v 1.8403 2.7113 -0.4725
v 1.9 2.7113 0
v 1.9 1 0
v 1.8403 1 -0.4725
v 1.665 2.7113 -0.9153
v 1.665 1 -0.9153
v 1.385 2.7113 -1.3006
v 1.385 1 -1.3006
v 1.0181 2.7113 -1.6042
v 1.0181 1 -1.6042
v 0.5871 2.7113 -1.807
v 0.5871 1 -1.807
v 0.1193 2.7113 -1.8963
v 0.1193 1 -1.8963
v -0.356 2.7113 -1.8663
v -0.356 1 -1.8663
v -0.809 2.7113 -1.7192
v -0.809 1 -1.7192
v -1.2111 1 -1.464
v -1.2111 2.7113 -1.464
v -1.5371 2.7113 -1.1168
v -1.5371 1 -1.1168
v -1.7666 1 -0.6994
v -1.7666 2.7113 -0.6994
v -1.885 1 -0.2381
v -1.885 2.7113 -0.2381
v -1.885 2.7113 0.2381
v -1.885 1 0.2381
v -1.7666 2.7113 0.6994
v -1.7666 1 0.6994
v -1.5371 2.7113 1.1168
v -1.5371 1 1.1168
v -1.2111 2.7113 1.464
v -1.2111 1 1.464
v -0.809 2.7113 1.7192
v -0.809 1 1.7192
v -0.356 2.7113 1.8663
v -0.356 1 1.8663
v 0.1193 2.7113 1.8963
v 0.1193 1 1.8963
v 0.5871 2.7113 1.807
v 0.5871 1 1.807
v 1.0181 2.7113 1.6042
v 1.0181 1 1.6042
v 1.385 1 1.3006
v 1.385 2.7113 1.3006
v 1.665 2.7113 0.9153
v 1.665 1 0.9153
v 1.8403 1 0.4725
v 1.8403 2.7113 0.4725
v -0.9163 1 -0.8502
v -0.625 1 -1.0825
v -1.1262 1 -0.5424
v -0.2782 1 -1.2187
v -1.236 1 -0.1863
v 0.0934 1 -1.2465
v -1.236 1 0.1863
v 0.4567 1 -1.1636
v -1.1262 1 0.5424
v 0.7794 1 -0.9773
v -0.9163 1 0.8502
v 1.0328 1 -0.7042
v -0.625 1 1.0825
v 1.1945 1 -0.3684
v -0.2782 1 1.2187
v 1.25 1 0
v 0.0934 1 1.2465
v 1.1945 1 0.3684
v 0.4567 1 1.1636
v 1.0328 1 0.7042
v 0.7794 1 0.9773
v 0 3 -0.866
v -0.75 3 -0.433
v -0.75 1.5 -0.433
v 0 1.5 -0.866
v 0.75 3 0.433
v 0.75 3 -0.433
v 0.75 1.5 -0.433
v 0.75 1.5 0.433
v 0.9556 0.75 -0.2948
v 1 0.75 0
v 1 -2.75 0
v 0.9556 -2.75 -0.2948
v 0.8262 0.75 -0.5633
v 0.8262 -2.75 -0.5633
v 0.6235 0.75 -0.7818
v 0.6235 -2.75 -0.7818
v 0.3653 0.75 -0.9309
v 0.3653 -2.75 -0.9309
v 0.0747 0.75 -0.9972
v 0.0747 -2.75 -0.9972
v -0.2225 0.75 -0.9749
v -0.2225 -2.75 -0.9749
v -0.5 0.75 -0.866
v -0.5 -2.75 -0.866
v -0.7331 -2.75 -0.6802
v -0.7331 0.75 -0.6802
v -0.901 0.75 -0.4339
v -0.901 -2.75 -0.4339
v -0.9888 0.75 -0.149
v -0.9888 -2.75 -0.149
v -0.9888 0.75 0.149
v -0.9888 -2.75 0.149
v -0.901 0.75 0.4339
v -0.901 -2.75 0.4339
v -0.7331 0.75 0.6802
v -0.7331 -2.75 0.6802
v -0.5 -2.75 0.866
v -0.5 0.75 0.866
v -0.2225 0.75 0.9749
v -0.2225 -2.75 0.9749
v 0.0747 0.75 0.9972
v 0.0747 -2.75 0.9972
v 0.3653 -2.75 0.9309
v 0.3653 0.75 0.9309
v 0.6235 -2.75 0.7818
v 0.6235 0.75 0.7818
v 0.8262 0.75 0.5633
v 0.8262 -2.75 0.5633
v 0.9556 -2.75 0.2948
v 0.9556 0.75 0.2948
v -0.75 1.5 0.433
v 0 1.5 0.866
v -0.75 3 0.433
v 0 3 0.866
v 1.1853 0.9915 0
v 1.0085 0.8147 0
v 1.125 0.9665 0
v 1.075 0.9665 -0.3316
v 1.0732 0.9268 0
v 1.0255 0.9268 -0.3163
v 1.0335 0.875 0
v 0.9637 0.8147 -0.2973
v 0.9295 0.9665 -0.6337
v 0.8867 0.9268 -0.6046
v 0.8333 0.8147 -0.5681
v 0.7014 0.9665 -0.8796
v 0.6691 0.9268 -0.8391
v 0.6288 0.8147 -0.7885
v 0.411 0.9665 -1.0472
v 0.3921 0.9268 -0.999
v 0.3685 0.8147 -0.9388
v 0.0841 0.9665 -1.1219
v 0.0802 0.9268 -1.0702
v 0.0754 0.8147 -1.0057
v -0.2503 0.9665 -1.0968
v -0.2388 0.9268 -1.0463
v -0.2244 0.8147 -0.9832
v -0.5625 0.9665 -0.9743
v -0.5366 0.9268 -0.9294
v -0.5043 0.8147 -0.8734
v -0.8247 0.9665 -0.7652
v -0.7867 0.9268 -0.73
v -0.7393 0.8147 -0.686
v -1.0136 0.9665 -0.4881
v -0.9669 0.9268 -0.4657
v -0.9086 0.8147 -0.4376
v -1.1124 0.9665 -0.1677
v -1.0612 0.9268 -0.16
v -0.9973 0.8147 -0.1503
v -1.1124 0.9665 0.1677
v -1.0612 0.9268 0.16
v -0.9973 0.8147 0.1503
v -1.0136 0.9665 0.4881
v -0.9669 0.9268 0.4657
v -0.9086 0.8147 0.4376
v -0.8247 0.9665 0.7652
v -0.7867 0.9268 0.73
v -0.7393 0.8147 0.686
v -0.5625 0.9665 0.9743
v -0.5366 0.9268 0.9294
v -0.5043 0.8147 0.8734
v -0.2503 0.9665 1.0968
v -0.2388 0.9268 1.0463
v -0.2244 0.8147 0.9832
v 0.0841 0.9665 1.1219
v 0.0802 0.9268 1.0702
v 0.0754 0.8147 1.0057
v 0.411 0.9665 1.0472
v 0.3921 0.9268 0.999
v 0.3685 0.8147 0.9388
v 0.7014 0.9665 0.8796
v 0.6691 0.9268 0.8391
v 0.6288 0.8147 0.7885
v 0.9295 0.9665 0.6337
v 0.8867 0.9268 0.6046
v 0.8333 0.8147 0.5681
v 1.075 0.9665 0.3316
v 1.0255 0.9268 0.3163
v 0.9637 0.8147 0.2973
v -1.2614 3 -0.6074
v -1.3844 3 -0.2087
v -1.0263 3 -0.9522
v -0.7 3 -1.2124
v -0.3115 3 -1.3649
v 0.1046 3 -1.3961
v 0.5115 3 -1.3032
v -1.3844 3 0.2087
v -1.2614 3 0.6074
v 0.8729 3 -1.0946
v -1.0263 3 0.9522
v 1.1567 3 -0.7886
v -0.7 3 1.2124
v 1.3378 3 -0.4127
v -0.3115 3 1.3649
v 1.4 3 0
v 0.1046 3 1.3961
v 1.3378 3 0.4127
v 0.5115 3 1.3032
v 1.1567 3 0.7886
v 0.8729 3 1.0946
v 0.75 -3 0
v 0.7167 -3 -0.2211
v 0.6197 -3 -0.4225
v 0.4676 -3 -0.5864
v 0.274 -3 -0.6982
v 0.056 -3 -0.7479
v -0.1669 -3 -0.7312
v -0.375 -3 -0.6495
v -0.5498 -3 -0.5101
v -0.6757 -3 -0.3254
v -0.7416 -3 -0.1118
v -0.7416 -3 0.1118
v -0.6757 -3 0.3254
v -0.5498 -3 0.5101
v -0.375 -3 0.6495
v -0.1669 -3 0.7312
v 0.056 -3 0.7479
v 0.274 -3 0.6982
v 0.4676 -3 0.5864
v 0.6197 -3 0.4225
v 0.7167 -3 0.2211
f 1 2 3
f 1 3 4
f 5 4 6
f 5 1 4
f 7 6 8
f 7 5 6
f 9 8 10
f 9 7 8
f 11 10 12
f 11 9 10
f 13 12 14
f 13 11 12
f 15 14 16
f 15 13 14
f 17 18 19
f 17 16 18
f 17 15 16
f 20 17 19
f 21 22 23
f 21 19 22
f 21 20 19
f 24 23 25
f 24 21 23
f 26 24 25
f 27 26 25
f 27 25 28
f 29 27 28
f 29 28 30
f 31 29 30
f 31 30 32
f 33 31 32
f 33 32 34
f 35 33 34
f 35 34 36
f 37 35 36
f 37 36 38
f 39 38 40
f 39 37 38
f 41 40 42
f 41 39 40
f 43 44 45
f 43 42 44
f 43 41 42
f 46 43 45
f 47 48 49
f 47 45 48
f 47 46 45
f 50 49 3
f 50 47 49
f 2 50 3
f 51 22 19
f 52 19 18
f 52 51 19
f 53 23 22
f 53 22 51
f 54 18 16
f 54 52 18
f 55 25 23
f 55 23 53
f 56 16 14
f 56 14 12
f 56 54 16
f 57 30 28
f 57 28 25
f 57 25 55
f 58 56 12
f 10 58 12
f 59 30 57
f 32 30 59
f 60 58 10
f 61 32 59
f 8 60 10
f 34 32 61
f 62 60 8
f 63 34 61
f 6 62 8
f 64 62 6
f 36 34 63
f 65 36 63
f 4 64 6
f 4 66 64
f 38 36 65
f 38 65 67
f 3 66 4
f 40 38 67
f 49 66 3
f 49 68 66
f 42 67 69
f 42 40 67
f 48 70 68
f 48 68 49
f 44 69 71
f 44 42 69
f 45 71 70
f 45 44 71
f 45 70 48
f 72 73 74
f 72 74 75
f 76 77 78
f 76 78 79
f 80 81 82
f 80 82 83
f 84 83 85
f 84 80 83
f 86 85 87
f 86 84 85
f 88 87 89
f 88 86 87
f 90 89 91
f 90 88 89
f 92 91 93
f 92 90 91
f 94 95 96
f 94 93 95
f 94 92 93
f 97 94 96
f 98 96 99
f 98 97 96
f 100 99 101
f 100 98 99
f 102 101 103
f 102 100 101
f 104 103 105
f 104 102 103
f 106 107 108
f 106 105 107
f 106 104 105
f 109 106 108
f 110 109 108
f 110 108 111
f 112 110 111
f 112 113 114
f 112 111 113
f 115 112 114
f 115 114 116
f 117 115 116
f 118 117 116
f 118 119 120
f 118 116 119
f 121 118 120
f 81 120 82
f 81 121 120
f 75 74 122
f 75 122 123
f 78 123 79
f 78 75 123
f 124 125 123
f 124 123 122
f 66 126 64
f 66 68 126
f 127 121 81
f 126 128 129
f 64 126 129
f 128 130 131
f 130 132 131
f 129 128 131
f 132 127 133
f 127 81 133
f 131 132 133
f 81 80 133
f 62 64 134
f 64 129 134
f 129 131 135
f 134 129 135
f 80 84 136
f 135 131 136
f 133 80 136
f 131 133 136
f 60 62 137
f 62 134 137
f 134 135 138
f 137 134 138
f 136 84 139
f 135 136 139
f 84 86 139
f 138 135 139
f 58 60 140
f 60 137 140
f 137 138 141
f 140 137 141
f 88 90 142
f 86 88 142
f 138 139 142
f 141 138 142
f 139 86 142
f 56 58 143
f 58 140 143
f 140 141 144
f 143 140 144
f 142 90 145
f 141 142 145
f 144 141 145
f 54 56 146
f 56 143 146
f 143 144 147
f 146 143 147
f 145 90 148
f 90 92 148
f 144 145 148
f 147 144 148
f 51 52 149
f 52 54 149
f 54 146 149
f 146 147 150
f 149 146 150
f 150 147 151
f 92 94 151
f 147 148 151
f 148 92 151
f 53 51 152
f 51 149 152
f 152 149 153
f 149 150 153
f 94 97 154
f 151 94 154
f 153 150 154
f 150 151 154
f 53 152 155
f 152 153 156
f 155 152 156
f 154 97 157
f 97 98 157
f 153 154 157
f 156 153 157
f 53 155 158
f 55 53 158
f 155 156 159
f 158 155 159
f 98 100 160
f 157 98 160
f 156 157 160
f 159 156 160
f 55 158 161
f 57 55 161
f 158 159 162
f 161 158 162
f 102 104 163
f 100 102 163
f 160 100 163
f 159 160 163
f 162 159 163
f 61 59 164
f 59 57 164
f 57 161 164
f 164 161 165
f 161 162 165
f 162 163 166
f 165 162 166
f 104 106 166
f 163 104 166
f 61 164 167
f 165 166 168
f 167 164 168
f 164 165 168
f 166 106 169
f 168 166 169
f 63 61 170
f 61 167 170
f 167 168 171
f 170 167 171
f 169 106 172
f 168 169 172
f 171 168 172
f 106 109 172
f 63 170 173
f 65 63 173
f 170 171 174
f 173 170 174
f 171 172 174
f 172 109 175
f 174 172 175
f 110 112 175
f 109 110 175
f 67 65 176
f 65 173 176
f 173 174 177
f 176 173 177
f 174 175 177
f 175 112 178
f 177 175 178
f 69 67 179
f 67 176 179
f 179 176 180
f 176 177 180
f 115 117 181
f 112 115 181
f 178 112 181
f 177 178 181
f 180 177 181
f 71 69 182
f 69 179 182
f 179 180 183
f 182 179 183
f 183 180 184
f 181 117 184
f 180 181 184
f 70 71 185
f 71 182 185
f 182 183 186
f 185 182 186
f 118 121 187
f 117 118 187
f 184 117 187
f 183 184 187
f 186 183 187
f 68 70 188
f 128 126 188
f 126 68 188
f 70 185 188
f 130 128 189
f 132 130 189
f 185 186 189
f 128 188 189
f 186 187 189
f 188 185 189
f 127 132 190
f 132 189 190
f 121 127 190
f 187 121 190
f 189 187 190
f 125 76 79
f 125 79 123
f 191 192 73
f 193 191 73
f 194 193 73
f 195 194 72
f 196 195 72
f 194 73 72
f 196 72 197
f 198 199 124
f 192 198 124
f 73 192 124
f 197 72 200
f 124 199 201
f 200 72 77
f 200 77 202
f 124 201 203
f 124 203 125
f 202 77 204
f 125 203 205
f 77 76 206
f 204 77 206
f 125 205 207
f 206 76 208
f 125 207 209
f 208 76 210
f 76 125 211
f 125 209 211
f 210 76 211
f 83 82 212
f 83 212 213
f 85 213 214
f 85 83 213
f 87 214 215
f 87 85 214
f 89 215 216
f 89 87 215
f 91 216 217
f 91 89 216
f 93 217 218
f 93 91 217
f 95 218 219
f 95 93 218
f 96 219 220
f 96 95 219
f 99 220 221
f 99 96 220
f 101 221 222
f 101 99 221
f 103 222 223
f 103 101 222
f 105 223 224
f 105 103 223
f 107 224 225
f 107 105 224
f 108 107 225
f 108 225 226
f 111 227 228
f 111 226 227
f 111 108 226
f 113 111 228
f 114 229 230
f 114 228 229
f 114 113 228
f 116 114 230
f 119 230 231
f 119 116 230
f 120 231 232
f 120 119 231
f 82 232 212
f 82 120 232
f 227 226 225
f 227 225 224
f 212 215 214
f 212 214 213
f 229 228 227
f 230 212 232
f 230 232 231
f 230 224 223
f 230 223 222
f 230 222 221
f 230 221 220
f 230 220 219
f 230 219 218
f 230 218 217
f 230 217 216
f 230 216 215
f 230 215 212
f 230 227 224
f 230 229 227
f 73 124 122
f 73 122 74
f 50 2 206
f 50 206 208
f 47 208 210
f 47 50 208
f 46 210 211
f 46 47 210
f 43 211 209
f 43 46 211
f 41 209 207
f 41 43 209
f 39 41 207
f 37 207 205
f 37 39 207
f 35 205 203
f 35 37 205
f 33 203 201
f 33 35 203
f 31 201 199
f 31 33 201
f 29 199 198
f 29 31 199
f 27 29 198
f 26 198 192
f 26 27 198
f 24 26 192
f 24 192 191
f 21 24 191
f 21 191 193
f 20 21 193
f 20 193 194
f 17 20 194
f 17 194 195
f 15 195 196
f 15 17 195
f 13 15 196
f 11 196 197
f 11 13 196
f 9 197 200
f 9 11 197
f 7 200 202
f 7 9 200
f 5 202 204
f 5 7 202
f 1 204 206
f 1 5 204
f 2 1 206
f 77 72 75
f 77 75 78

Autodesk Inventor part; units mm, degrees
ref_plane "YZ Plane" through (0, 0, 0) normal (1, 0, 0) x (0, 1, 0)
ref_plane "XZ Plane" through (0, 0, 0) normal (0, 1, 0) x (-1, 0, 0)
ref_plane "XY Plane" through (0, 0, 0) normal (0, 0, 1) x (1, 0, 0)
sketch "Sketch1" plane through (0, 0, 0) normal (0, 0, 1) x (1, 0, 0)
  line L0 (0, 3) -> (0, -3)
  line L1 (0, -3) -> (0.75, -3)
  line L2 (0.75, -3) -> (1, -2.75)
  line L3 (1, -2.75) -> (1, 0.75)
  line L4 (1.25, 1) -> (1.9, 1)
  line L5 (1.9, 1) -> (1.9, 2.7113)
  line L6 (1.4, 3) -> (0, 3)
  arc A0 (1.25, 1) -> (1, 0.75) centre (1.25, 0.75) ccw
  line L7 (1.4, 3) -> (1.9, 2.7113)
  point P0 (0, 0)
  point P1 (1.9, 3)
  point P2 (0, 0)
  dimension "d0" = 3.8
  dimension "d1" = 2
  dimension "d3" = 2
  dimension "d4" = 2.5
  dimension "d5" = 135
  dimension "d6" = 0.25
  dimension "d7" = 4
  dimension "d9" = 0.5
  dimension "d10" = 30
revolve "Revolution1" add sketch "Sketch1" angle 360 about axis through (0, 3, 0) along (0, -1, 0)
sketch "Sketch2" plane through (0, 3, 0) normal (0, 1, 0) x (1, 0, 0)
  line L0 (0, -0.866) -> (-0.75, -0.433)
  line L1 (-0.75, -0.433) -> (-0.75, 0.433)
  line L2 (-0.75, 0.433) -> (0, 0.866)
  line L3 (0, 0.866) -> (0.75, 0.433)
  line L4 (0.75, 0.433) -> (0.75, -0.433)
  line L5 (0.75, -0.433) -> (0, -0.866)
  point P0 (0, 0)
  point P1 (0, 0)
  dimension "d11" = 1.5
extrude "Extrusion1" cut sketch "Sketch2" against normal blind 1.5
thread "Thread1" size "M2x0.4" class "6g" standard "ANSI Metric M Profile" full length
properties part number "Bolt_M2x0.4_4mm_SH" material "Stainless Steel"
